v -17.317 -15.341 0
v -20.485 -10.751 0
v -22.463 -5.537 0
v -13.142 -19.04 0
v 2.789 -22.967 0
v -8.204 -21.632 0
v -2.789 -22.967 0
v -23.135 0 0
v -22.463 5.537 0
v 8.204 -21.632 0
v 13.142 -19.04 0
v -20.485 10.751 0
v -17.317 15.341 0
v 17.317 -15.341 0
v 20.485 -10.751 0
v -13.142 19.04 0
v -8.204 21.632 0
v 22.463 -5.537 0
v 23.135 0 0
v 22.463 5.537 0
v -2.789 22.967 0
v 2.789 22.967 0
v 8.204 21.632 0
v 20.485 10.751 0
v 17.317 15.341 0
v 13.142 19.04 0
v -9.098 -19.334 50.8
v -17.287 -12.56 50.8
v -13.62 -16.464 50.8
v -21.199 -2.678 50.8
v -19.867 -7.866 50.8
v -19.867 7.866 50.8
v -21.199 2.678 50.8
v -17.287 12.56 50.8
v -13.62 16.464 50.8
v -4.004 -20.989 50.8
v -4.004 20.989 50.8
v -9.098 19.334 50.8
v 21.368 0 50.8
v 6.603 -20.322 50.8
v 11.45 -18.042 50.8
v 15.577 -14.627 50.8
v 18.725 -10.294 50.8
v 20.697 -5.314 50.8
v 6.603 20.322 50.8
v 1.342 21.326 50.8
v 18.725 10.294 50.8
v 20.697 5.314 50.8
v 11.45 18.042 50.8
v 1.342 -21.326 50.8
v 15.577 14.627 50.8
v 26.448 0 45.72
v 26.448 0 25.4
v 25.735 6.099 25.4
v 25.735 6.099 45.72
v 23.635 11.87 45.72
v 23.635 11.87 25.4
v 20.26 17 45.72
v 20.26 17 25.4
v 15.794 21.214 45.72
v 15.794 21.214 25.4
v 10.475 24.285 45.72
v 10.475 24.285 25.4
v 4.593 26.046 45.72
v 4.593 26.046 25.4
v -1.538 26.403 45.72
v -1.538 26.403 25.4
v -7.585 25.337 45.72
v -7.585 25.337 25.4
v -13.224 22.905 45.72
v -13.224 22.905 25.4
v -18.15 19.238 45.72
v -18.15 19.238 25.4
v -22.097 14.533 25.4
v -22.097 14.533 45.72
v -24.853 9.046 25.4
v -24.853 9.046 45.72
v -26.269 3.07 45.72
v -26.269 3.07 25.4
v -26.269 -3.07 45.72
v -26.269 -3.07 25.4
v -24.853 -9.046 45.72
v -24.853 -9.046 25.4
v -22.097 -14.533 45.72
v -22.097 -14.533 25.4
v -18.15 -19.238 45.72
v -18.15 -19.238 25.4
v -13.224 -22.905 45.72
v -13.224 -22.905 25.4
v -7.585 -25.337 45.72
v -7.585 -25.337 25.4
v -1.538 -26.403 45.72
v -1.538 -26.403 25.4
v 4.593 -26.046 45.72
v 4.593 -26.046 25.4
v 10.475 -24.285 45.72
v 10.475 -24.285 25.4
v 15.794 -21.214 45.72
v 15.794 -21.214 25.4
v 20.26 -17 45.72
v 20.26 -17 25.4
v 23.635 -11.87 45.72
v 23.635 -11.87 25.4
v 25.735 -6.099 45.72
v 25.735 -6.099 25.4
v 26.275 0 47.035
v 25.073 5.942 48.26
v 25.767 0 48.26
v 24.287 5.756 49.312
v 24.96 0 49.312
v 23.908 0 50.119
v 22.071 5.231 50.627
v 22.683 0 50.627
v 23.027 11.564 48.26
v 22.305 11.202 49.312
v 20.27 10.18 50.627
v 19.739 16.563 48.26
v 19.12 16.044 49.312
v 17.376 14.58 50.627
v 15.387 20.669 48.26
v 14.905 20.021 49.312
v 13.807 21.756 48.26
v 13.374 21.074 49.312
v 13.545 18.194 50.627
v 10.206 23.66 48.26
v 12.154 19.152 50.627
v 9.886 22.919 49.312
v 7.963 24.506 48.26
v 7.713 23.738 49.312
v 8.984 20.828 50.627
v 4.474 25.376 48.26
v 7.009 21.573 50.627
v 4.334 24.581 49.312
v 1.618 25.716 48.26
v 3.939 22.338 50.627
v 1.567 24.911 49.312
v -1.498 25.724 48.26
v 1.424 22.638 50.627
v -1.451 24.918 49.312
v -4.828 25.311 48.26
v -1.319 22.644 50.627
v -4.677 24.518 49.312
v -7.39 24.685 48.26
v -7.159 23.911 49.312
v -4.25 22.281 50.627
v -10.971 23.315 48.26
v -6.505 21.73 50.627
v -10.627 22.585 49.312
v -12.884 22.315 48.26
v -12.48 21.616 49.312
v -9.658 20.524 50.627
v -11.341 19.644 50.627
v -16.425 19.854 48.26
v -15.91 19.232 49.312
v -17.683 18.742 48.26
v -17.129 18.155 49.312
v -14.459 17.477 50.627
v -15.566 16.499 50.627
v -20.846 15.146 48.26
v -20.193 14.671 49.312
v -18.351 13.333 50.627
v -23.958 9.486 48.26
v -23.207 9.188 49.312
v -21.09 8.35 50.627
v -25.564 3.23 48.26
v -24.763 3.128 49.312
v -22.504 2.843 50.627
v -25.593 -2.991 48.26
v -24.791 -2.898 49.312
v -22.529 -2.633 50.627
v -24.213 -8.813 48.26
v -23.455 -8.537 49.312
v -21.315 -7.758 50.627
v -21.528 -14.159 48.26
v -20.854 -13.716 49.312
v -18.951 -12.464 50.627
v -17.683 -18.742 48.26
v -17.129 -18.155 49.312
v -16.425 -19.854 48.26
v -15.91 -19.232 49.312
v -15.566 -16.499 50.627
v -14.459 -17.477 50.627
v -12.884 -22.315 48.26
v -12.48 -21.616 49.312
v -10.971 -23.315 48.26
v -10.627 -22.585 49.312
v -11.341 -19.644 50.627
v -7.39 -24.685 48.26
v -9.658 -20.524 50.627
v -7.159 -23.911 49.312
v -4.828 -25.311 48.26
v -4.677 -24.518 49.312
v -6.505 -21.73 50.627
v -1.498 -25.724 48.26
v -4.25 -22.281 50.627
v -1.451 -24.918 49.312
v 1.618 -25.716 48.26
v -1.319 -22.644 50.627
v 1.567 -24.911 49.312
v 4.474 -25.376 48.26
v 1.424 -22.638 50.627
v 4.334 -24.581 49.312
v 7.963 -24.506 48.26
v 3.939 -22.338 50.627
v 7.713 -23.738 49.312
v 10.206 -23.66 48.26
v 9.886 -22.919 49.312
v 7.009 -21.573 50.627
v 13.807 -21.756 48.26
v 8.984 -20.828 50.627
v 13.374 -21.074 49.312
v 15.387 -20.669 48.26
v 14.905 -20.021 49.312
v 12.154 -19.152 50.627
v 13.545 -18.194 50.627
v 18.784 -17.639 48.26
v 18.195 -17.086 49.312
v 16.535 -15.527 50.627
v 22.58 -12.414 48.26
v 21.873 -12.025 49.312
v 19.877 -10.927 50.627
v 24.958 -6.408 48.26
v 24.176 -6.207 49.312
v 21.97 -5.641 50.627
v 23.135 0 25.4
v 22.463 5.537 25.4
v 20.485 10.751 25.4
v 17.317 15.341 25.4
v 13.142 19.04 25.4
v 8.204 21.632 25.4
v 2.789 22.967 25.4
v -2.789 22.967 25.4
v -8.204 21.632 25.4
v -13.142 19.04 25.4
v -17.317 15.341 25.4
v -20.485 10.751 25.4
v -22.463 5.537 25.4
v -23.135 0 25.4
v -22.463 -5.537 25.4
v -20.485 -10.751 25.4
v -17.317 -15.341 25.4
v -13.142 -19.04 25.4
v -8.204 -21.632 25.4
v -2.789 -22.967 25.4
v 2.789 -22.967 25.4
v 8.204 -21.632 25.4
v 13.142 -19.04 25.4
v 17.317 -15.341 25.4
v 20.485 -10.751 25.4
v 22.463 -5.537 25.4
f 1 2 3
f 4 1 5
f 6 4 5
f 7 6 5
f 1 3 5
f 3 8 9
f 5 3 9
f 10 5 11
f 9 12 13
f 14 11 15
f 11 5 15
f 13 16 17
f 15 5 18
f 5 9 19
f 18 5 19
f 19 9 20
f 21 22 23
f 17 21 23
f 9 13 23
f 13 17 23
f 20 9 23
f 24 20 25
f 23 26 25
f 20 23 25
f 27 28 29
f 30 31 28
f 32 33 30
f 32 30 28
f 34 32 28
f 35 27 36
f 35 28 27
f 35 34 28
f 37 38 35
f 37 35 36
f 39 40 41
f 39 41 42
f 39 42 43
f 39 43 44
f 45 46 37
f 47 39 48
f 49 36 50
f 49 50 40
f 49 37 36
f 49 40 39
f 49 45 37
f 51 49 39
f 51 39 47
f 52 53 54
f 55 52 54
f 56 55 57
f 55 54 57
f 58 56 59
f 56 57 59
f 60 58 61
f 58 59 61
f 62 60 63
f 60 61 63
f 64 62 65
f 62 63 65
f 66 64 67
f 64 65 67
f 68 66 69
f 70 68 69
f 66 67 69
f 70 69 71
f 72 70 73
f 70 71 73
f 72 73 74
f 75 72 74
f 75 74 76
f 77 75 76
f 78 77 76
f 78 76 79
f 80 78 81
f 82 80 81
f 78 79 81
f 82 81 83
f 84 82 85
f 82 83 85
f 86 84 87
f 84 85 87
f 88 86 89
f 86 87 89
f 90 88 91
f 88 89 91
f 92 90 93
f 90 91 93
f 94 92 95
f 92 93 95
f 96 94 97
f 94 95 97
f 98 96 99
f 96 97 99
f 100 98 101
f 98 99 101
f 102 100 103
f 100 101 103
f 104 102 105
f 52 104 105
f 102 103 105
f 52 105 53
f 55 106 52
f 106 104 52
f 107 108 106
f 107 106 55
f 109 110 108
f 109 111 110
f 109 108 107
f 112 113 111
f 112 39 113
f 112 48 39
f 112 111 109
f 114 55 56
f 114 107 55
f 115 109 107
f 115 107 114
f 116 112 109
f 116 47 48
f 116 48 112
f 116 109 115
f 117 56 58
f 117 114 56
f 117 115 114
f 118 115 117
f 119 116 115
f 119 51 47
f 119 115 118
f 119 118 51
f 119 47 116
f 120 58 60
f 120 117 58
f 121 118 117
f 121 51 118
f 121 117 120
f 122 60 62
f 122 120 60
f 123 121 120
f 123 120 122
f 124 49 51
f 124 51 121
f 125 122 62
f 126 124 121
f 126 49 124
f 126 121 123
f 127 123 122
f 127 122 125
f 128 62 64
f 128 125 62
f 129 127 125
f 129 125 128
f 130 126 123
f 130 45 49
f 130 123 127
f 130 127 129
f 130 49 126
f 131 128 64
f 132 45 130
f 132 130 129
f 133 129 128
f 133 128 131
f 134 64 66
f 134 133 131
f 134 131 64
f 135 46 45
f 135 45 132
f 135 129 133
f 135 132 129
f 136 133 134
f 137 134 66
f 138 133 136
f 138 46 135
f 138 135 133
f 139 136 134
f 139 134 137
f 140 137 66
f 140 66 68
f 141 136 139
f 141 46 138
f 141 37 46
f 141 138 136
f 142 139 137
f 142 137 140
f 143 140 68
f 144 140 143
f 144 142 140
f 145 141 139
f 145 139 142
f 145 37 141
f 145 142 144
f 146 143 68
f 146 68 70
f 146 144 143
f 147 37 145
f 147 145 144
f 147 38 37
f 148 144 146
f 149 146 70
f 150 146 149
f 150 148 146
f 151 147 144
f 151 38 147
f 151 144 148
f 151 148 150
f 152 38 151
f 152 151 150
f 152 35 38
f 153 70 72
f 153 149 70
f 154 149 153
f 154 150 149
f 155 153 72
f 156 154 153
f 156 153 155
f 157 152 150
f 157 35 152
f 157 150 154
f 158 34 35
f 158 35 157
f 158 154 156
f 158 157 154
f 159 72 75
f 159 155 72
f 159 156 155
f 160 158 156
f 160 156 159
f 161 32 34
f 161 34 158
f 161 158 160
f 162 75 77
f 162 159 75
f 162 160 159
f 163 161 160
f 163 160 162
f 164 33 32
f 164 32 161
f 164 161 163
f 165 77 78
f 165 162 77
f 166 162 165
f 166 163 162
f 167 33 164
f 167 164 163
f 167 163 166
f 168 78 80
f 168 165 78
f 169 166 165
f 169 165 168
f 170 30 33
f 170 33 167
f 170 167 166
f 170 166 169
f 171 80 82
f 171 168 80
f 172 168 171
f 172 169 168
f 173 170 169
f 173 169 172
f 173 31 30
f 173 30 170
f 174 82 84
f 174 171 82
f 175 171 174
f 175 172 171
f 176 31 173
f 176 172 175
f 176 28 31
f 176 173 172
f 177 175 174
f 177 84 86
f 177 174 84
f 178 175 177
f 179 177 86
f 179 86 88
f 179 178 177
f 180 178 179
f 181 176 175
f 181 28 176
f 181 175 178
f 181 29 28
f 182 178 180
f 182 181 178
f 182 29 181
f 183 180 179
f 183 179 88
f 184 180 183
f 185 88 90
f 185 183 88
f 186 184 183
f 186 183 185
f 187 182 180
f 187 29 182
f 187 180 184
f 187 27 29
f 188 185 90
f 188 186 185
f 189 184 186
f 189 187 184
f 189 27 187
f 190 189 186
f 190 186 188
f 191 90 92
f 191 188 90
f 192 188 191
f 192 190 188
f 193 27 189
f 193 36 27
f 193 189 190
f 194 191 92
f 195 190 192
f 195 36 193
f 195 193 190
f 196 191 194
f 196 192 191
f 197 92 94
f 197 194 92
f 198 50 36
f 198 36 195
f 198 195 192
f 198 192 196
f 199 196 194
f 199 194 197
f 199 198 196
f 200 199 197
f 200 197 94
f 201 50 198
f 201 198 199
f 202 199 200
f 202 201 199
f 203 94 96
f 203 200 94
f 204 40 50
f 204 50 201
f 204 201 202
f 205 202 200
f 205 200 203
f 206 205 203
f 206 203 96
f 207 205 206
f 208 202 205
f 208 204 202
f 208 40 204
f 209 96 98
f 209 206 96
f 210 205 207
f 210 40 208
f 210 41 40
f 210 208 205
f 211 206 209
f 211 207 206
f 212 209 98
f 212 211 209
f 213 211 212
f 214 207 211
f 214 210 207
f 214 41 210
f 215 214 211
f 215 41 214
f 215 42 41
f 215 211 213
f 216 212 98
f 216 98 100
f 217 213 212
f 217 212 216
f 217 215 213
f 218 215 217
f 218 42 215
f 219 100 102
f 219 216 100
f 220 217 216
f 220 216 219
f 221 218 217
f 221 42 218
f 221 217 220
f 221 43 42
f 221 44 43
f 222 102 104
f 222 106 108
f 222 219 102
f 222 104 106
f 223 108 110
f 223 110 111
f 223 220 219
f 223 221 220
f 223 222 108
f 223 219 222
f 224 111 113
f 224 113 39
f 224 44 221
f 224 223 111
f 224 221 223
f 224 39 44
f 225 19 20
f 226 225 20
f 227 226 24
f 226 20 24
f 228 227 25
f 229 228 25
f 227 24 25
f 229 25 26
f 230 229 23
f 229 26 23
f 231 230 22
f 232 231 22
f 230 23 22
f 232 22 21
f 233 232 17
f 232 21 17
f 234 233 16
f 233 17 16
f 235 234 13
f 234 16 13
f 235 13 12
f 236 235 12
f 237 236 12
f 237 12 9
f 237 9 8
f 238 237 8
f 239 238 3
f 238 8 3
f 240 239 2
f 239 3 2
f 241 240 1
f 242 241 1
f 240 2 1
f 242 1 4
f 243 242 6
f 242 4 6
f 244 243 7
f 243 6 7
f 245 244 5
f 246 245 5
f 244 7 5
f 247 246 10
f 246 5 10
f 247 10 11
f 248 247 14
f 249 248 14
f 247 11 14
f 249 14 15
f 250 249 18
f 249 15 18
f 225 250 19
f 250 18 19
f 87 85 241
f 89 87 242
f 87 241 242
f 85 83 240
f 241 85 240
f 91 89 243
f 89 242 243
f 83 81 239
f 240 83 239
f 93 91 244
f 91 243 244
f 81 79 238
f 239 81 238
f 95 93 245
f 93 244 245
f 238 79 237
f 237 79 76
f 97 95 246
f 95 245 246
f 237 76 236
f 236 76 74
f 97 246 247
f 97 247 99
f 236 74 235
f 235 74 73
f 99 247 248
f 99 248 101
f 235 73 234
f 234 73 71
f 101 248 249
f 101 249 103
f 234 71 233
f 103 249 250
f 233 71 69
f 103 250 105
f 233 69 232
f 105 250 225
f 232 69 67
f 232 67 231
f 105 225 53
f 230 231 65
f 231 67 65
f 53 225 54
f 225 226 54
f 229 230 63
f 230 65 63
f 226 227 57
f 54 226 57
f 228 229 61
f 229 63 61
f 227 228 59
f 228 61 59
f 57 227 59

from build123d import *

# Parameters (mm, degrees)
F0_R      = 23.135211
F1_DEPTH  = 25.4
F2_R      = 26.447922
F2_R_2    = 23.135211
F1_FACE_R = 23.135211
F3_DEPTH  = 25.4
F4_R      = 5.08


with BuildPart() as f1:
    # F0 (on Top) → F1 (new body)
    with BuildSketch(Plane.XY):
        Circle(F0_R)
    extrude(amount=F1_DEPTH)

    # F2 (on face) + F1_face (on face) → F3 (join)
    with BuildSketch(Plane.XY.offset(25.4)):
        Circle(F2_R)
        Circle(F2_R_2, mode=Mode.SUBTRACT)
        Circle(F2_R_2)
    with BuildSketch(Plane.XY.offset(25.4)):
        Circle(F1_FACE_R)
    extrude(amount=F3_DEPTH)

    # F4
    f4_edges = [f1.edges().sort_by_distance(p)[0] for p in [
        (-26.447922, 0, 50.8),
    ]]
    fillet(f4_edges, radius=F4_R)


solid = f1.part
